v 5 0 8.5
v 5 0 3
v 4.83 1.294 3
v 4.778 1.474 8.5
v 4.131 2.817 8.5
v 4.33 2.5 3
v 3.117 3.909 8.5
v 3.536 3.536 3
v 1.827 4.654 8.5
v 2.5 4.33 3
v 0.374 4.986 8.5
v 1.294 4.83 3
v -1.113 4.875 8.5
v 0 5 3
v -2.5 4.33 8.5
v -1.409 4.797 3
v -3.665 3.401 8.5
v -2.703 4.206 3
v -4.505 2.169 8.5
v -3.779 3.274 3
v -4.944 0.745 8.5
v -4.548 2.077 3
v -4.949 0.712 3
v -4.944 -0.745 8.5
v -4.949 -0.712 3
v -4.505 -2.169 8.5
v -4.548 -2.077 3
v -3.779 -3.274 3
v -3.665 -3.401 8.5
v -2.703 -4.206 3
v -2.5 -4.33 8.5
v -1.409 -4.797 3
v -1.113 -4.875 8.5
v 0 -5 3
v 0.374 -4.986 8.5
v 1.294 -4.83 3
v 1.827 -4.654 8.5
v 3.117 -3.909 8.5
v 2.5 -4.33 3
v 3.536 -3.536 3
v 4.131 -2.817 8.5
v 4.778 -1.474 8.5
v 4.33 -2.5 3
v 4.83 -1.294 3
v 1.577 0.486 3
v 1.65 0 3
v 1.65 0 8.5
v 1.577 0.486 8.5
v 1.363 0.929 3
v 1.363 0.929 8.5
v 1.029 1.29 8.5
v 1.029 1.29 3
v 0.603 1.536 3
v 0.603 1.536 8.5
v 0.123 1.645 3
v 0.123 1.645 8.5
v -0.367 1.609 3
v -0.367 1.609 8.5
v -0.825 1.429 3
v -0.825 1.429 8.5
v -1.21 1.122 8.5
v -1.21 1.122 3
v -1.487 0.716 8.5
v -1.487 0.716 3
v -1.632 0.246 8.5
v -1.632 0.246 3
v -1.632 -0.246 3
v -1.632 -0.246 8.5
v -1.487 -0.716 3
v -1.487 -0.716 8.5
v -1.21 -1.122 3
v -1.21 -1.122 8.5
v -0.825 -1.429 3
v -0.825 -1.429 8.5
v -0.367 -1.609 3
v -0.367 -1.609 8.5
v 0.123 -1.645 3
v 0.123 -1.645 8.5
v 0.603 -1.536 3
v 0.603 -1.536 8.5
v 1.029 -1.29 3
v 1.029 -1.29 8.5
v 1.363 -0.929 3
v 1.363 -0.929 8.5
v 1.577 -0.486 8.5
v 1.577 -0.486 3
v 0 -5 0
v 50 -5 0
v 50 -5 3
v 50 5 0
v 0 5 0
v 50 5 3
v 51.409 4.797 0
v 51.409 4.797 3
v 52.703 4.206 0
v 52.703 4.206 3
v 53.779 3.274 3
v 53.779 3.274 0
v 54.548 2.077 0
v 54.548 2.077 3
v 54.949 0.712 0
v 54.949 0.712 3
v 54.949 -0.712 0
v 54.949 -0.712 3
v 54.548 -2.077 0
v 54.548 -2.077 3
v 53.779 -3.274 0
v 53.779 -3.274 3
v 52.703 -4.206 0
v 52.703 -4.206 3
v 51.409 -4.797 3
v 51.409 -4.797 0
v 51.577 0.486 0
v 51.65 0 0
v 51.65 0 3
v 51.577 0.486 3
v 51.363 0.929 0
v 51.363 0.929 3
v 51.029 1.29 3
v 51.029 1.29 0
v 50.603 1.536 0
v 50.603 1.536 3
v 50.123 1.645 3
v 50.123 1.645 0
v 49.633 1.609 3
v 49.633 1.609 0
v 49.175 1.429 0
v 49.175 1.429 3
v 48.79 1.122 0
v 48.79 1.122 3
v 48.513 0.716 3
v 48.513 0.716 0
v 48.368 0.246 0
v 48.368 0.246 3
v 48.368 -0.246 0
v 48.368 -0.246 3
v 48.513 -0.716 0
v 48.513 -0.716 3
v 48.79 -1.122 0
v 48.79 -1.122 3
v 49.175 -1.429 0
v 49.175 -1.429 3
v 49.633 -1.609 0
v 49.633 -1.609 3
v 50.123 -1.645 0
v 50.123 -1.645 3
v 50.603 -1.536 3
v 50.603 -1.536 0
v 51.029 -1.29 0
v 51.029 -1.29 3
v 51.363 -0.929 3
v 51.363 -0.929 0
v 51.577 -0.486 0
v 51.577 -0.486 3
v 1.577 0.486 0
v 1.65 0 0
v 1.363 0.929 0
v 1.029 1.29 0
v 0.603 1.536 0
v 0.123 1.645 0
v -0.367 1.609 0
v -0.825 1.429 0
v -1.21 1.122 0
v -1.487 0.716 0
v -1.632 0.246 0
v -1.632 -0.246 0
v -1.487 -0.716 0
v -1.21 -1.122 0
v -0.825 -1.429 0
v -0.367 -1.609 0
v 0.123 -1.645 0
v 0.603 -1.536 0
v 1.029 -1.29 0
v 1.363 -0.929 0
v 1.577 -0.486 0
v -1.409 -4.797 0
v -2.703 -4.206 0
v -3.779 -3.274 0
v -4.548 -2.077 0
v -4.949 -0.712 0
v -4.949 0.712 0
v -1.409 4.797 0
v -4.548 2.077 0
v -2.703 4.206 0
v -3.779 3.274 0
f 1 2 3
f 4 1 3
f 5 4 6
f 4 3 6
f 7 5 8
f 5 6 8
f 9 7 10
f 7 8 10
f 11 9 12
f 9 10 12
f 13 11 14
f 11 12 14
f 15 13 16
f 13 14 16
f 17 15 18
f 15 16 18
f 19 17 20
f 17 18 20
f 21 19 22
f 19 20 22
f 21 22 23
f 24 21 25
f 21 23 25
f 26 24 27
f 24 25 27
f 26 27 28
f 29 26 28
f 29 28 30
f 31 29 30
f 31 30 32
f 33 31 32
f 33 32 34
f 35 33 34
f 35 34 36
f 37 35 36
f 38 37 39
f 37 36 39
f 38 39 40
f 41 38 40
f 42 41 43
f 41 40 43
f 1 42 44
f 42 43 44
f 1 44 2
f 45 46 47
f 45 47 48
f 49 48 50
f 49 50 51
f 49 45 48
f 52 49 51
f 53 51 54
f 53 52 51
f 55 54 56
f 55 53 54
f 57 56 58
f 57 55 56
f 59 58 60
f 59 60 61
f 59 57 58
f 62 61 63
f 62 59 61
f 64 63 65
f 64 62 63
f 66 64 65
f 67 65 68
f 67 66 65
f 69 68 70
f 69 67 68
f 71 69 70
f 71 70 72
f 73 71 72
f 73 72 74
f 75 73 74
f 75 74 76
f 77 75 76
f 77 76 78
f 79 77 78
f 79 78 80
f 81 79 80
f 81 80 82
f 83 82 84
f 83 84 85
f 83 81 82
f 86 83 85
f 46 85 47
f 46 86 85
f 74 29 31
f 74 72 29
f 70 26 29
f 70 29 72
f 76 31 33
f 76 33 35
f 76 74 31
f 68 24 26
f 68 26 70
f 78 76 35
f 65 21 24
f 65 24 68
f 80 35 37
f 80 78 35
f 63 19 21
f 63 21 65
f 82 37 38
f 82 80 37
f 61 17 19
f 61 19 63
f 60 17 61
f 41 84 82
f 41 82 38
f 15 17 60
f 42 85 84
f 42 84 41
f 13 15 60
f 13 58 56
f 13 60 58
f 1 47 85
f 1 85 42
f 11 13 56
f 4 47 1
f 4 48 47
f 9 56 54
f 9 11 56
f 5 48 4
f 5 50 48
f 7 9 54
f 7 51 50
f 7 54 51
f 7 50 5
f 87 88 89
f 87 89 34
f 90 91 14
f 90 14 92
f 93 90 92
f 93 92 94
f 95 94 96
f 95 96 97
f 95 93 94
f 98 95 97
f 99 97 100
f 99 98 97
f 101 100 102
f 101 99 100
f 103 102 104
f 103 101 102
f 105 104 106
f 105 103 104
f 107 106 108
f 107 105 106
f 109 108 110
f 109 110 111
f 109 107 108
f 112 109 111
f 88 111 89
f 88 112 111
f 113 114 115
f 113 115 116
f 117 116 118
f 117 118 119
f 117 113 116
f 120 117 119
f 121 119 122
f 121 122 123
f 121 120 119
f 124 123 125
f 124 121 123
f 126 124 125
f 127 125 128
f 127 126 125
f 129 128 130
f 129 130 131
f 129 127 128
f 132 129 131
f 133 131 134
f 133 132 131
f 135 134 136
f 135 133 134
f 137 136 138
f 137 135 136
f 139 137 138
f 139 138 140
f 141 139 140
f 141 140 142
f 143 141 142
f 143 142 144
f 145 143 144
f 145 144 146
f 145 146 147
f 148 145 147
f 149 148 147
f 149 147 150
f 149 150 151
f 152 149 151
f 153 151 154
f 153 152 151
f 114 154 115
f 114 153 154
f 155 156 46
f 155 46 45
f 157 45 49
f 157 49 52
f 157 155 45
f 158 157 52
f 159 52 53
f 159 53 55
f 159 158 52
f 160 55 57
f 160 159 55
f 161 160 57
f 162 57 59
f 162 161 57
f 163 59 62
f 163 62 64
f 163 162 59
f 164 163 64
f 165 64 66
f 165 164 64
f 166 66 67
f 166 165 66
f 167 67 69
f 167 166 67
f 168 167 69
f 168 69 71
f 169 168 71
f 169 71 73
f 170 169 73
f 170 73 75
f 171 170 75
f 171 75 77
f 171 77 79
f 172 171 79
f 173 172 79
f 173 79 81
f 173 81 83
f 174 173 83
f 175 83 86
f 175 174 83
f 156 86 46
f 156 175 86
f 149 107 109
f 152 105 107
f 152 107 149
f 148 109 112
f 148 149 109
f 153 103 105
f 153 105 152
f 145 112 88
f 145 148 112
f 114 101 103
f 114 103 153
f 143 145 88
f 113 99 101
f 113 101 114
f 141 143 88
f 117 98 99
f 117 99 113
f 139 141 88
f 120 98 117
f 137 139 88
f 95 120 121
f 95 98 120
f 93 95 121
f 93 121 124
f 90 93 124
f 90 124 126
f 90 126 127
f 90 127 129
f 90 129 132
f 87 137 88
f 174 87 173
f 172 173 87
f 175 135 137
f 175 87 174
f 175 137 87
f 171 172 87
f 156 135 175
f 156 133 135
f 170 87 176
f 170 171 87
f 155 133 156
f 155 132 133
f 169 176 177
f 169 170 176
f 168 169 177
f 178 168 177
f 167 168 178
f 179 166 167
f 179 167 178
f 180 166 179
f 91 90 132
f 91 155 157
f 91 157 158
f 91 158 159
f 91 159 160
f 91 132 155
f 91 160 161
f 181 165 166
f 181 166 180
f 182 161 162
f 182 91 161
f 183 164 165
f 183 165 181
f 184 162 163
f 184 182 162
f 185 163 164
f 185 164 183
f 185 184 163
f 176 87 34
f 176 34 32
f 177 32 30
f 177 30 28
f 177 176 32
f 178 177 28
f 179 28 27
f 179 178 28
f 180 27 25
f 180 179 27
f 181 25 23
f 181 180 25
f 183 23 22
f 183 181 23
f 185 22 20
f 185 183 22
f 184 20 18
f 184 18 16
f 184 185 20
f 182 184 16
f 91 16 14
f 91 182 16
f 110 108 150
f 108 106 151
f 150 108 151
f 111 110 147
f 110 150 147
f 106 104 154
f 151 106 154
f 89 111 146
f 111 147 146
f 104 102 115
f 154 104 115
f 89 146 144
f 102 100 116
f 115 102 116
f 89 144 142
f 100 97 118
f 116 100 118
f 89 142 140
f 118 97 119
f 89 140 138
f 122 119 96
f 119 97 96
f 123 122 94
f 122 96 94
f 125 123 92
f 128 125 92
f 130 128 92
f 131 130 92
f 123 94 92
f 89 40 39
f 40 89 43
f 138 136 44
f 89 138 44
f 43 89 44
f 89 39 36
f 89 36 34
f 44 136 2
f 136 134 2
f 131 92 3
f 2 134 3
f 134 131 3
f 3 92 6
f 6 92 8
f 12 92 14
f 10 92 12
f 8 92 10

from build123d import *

# Parameters (mm, degrees)
SKETCH_1_R      = 1.65
EXTRUDE_1_DEPTH = 3
SKETCH_2_R      = 5
SKETCH_2_R_2    = 1.65
EXTRUDE_2_DEPTH = 5.5


with BuildPart() as part:
    # 草圖1 → 填料-伸長1 (new body)
    with BuildSketch(Plane.XY):
        with BuildLine():
            Line((0, 5), (50, 5))
            ThreePointArc((50, 5), (55, 0), (50, -5))
            Line((50, -5), (0, -5))
            ThreePointArc((0, -5), (-5, 0), (0, 5))
        make_face()
        Circle(SKETCH_1_R, mode=Mode.SUBTRACT)
        with Locations((50, 0)):
            Circle(SKETCH_1_R, mode=Mode.SUBTRACT)
    extrude(amount=EXTRUDE_1_DEPTH)

    # 草圖2 → 填料-伸長2 (add)
    with BuildSketch(Plane.XY.offset(3)):
        Circle(SKETCH_2_R)
        Circle(SKETCH_2_R_2, mode=Mode.SUBTRACT)
    extrude(amount=EXTRUDE_2_DEPTH)


solid = part.part
